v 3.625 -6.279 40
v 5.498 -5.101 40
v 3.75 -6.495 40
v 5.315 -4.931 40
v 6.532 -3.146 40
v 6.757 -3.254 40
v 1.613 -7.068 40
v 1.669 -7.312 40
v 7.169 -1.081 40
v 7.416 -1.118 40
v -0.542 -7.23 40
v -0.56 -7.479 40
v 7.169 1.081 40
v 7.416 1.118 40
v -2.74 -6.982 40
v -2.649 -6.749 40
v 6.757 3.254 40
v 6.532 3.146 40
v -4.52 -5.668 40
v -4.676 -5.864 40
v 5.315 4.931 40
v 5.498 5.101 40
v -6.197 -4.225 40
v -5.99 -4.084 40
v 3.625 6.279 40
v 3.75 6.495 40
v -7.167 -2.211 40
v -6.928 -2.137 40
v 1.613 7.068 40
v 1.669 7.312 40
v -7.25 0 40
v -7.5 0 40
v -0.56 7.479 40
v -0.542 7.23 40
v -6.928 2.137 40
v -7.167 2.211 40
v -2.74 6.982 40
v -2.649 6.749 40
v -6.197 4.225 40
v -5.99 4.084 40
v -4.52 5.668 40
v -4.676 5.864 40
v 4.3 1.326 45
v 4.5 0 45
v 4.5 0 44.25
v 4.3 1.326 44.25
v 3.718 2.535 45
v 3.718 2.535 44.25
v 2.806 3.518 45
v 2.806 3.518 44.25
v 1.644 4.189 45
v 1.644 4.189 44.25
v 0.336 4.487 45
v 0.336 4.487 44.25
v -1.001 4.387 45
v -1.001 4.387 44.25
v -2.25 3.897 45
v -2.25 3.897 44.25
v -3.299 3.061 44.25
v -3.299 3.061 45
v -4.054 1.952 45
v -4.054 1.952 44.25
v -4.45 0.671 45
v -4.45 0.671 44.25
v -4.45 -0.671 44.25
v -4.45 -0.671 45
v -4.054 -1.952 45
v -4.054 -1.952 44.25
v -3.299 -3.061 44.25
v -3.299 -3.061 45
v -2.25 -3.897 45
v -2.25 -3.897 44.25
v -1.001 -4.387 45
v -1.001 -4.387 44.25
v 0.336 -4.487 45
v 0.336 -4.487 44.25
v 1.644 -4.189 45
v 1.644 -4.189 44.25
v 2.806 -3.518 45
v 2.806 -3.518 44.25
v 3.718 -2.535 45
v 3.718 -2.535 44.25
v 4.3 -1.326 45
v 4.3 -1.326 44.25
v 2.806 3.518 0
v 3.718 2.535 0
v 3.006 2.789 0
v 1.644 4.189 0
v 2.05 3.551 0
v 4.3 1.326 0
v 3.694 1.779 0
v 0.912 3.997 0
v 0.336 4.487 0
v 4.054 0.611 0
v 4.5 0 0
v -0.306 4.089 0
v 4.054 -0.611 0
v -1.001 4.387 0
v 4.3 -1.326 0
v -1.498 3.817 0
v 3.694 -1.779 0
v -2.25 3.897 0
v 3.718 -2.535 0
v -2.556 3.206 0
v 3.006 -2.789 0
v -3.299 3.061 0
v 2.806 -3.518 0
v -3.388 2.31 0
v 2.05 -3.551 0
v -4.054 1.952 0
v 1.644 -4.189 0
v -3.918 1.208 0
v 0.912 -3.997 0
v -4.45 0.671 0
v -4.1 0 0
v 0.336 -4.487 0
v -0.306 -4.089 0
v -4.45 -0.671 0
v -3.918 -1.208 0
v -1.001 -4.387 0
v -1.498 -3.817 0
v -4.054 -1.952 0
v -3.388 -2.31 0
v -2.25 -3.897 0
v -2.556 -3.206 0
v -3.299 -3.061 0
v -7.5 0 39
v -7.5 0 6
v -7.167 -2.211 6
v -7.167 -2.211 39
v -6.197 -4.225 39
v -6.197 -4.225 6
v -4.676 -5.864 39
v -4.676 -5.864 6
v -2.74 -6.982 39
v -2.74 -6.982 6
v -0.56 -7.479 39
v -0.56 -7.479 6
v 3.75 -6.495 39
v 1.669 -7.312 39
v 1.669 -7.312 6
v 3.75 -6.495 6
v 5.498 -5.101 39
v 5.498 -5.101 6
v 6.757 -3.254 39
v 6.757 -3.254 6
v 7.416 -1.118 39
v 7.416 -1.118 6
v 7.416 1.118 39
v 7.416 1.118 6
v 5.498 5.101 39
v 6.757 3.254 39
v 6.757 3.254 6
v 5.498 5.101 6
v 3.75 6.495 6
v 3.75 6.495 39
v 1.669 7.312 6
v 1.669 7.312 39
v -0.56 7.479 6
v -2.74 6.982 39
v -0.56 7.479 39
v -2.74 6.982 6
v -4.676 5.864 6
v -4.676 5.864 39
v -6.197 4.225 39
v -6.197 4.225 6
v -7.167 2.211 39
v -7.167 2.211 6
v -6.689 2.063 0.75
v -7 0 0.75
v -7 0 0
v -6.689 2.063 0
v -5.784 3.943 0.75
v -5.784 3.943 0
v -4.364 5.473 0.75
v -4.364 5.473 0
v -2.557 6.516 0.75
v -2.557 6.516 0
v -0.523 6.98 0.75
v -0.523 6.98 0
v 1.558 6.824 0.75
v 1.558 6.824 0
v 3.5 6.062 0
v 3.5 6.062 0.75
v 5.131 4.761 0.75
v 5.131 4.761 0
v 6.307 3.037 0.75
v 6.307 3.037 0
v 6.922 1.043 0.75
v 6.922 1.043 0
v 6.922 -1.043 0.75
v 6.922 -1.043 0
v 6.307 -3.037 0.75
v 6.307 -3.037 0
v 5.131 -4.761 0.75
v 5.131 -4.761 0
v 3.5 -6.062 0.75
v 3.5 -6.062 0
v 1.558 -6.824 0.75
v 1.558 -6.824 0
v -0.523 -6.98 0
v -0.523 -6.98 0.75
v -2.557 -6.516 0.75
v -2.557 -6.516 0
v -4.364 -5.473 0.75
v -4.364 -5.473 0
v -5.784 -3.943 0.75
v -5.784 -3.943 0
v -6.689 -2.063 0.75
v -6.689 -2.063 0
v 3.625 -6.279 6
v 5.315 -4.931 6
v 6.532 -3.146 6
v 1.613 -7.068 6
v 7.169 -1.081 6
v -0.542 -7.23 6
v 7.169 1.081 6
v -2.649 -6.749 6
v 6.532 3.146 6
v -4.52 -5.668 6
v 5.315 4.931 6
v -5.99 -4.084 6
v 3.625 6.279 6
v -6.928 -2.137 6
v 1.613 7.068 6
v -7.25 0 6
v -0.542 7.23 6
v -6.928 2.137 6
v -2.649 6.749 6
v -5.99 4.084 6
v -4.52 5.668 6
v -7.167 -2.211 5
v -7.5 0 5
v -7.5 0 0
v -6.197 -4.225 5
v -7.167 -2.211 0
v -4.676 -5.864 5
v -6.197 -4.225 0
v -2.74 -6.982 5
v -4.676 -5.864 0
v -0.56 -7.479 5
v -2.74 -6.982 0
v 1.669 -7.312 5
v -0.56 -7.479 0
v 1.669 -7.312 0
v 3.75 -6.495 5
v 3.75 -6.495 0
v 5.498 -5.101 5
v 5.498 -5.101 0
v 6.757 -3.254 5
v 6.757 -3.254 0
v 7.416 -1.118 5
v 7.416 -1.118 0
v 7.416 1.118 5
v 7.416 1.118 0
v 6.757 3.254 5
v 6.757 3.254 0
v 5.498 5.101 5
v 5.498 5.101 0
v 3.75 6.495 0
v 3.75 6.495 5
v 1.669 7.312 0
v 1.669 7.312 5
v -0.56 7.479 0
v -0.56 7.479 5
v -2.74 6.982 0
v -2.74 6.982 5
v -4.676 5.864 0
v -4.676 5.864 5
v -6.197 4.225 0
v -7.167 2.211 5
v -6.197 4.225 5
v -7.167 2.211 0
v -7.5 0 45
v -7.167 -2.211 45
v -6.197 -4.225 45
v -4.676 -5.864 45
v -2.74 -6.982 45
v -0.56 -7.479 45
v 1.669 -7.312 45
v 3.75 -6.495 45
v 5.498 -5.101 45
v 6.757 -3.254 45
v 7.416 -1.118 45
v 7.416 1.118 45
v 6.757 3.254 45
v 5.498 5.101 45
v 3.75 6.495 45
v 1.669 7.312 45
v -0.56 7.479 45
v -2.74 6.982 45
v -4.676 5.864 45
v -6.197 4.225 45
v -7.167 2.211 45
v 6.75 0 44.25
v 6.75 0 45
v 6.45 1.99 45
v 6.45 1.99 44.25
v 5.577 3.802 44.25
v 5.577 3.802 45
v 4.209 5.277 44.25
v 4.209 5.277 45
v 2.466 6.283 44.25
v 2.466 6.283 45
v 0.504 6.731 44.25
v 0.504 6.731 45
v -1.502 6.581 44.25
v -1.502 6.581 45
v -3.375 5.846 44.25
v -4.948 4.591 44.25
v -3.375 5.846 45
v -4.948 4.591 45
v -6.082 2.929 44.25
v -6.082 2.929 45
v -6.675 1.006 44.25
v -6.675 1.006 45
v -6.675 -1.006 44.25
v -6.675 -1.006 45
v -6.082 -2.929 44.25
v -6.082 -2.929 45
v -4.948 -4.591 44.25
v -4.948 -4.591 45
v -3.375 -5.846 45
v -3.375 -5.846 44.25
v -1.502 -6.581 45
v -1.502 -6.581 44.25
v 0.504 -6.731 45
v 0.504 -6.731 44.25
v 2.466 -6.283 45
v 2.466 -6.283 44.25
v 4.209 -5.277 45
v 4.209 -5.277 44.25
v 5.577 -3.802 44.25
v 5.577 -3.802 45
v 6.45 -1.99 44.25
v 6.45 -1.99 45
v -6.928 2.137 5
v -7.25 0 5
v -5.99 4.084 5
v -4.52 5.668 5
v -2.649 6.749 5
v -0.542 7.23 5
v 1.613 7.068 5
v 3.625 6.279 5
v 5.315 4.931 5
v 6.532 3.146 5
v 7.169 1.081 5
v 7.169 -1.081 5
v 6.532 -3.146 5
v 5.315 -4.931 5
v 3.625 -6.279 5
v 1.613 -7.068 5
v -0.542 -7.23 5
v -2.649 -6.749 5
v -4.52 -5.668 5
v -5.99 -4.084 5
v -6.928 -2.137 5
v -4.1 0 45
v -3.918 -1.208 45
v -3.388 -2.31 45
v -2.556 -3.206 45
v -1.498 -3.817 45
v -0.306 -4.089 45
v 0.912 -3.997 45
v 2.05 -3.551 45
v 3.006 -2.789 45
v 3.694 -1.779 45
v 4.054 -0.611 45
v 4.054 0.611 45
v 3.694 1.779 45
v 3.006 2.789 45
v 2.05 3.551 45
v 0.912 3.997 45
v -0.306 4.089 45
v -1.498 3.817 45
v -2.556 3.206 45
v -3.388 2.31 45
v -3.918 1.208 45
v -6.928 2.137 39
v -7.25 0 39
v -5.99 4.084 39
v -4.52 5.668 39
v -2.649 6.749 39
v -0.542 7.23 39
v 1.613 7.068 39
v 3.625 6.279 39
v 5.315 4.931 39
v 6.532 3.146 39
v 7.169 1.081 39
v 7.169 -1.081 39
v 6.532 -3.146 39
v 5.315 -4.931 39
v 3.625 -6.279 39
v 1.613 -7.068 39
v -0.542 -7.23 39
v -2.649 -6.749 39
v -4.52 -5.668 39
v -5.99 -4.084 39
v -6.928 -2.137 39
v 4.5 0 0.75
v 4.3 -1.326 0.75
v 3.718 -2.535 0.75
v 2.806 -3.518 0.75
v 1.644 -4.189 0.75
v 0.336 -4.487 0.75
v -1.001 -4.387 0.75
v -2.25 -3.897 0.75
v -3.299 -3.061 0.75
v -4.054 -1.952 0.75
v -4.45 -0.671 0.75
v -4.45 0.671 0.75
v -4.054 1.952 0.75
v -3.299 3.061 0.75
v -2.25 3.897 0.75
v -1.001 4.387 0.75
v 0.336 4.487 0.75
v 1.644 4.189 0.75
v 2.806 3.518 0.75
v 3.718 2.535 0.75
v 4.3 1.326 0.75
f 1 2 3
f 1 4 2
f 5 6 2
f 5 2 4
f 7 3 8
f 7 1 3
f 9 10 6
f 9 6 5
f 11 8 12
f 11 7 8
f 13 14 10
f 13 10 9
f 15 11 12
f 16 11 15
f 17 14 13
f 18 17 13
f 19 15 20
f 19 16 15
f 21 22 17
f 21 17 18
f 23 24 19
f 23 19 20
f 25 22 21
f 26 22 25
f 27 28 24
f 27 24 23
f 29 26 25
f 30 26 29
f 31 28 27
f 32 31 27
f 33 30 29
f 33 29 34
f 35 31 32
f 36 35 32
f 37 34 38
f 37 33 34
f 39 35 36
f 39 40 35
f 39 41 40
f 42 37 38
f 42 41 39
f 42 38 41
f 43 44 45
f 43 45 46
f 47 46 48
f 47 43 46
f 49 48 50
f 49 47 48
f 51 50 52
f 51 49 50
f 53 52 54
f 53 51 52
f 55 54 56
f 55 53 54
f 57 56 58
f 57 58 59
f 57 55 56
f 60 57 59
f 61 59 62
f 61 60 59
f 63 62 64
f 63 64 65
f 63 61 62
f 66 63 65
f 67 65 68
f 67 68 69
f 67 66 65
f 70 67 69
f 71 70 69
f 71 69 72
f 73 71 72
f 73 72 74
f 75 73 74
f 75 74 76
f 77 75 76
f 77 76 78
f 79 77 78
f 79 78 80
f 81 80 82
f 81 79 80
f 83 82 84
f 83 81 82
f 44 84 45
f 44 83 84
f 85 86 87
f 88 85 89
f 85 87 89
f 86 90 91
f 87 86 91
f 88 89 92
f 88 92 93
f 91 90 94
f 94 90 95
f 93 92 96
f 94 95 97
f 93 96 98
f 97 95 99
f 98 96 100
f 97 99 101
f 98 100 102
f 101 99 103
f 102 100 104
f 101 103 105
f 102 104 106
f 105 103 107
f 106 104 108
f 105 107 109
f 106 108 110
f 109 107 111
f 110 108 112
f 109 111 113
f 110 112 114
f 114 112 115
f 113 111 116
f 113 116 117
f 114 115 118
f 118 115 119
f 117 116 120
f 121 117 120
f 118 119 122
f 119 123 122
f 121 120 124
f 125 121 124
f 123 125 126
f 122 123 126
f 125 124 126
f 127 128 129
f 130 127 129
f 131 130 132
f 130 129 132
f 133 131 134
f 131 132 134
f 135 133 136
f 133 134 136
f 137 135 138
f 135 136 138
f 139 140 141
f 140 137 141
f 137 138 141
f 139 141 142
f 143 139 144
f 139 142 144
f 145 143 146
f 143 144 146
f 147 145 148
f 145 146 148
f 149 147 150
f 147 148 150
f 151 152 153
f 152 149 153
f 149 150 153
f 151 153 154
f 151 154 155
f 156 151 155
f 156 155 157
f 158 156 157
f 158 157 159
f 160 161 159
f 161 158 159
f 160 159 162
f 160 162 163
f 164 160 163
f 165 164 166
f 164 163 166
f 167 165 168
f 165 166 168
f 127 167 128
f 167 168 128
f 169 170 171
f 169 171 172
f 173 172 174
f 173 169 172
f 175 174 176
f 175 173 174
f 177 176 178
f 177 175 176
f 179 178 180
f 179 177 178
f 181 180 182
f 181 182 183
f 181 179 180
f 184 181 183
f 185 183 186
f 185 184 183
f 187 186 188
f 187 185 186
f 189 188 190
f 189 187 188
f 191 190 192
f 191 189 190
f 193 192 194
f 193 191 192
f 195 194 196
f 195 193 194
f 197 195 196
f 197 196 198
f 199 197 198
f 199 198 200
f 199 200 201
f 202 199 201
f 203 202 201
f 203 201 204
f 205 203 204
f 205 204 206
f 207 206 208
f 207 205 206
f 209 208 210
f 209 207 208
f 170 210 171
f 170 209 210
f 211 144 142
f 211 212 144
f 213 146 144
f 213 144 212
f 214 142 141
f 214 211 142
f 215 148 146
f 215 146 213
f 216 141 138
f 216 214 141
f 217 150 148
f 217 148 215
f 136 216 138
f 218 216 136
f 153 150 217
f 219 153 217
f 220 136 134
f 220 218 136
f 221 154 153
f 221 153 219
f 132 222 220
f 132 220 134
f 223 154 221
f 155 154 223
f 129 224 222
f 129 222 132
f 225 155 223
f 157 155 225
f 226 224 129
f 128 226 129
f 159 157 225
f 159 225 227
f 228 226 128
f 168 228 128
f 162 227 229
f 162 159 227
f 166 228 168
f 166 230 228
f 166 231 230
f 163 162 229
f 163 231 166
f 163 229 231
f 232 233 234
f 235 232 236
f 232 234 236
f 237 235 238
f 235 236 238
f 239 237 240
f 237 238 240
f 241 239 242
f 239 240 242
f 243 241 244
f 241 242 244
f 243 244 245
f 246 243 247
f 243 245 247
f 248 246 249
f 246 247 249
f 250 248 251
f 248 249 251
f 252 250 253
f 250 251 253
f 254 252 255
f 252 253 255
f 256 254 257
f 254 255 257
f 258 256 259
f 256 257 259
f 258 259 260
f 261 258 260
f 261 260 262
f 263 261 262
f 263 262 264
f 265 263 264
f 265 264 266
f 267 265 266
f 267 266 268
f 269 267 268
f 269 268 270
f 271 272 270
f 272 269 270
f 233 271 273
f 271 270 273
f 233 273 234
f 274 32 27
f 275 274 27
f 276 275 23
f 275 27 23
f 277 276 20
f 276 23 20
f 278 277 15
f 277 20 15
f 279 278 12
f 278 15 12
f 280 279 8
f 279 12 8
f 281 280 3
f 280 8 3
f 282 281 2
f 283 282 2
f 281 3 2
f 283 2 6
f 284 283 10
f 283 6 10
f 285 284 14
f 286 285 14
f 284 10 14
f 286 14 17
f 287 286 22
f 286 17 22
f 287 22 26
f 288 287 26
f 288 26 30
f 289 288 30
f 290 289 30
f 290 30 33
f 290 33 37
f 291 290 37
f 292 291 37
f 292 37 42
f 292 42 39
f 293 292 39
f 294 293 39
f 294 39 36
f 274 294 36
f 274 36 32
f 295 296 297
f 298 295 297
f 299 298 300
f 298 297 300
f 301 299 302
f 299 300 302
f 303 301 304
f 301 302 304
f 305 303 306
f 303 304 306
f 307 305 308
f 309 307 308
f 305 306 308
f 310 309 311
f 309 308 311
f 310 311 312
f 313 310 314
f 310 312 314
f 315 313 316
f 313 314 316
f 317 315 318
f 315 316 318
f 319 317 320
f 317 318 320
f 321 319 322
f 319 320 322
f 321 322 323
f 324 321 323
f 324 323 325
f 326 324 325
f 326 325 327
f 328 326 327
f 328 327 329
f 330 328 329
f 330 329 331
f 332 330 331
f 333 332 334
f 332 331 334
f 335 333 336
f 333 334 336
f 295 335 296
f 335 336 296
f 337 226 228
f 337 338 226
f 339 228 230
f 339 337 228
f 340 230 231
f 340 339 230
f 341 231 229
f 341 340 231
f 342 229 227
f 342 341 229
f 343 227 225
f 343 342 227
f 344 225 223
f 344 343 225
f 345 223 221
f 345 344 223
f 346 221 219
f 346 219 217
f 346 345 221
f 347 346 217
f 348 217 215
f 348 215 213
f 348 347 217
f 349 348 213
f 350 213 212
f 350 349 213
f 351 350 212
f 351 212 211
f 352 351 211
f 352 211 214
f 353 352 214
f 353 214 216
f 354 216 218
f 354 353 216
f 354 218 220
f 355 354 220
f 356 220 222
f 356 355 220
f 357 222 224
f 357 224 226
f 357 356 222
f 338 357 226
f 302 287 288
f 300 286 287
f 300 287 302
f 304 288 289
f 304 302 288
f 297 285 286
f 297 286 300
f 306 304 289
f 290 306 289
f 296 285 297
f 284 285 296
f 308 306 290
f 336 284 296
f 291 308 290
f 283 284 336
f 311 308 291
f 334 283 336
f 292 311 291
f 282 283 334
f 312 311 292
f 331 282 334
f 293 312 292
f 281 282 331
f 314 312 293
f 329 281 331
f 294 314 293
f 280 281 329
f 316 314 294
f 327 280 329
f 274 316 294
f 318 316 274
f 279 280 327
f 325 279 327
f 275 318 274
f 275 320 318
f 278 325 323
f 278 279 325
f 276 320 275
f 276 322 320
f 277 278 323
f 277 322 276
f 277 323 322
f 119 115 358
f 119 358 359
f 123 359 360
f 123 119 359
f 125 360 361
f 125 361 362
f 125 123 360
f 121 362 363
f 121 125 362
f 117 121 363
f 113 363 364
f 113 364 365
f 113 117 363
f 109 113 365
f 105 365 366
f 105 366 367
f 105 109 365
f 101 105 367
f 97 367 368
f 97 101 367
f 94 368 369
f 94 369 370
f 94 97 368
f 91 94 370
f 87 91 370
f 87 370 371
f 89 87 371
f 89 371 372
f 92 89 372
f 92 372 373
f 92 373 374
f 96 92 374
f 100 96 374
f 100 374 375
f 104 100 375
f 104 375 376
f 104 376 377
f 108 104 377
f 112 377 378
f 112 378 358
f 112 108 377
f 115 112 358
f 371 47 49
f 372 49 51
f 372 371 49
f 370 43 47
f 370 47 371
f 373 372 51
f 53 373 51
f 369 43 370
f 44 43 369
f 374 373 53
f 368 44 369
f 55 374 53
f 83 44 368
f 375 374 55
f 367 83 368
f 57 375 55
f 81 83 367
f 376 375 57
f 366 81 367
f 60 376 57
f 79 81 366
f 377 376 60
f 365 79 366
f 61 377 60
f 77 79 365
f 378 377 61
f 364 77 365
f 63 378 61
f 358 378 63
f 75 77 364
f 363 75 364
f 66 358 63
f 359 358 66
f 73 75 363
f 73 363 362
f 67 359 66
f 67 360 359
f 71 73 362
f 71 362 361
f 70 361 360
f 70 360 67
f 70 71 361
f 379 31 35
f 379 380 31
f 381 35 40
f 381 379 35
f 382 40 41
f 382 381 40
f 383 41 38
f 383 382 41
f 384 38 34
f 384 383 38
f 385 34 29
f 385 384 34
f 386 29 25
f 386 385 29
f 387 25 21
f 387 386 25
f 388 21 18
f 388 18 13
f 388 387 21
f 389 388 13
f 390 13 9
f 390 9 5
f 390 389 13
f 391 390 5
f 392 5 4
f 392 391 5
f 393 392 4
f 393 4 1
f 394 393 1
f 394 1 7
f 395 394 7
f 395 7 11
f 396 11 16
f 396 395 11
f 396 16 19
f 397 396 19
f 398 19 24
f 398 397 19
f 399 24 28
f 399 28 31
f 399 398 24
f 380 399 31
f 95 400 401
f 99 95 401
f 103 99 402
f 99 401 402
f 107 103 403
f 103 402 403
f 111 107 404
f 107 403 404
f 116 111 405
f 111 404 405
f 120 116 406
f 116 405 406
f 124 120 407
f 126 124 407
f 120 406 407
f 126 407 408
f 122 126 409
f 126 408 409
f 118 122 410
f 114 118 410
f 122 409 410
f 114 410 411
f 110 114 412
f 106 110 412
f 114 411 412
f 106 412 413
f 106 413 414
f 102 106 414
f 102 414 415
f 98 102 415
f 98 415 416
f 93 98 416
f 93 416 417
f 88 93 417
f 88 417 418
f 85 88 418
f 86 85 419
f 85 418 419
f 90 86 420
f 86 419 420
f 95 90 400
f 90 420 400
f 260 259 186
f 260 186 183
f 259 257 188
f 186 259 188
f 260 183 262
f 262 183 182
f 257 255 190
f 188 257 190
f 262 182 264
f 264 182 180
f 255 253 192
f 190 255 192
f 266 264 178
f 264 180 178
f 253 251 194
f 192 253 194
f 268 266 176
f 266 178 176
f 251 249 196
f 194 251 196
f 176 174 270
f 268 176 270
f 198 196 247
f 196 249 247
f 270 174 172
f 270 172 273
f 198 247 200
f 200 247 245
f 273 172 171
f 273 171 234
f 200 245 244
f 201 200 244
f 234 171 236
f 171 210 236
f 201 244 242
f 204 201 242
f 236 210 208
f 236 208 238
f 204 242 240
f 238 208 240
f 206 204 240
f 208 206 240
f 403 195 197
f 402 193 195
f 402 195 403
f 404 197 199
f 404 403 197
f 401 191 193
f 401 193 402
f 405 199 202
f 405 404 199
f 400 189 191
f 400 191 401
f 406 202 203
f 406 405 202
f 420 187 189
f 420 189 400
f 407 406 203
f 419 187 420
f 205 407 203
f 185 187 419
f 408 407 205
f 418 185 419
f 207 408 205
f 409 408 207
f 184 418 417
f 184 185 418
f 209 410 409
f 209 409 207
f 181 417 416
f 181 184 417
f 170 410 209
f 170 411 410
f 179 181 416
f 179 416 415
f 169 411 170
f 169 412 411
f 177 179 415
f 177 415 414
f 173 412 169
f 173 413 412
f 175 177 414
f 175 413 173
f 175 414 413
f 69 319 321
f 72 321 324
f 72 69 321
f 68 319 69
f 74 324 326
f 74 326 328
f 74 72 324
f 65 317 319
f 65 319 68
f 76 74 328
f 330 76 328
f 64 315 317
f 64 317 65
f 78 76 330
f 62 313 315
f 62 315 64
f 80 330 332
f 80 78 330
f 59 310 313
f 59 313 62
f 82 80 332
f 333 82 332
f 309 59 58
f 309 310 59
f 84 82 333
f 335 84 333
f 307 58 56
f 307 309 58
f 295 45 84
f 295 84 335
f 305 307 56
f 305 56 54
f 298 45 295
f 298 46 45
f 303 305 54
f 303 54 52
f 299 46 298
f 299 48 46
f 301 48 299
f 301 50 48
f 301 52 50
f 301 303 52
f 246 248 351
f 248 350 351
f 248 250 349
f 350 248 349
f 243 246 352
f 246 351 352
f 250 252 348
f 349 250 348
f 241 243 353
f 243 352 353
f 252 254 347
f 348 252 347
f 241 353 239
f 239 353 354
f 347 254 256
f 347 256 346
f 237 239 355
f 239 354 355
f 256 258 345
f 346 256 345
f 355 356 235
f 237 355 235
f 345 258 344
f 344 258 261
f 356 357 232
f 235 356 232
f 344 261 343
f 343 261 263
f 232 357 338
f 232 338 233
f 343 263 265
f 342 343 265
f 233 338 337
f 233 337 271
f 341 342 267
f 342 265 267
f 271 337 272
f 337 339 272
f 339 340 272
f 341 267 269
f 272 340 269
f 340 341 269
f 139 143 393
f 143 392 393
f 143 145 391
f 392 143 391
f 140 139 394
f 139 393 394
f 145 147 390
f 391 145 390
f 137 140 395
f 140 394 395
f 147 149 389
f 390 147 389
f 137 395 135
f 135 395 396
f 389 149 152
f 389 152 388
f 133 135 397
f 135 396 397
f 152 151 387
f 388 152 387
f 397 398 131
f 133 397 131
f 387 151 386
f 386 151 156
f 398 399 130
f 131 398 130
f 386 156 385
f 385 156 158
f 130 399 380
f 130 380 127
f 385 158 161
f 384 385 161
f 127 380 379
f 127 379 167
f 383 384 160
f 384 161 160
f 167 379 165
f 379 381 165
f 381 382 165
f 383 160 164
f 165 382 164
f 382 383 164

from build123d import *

# Parameters (mm, degrees)
SKETCH1_R           = 7.5
SKETCH1_R_2         = 4.1
BOSS_EXTRUDE1_DEPTH = 45
SKETCH2_R           = 6.75
SKETCH2_R_2         = 4.5
CUT_EXTRUDE2_DEPTH  = 0.75
CUT_EXTRUDE3_START  = -0.75
SKETCH3_R           = 7
SKETCH3_R_2         = 4.5
CUT_EXTRUDE3_DEPTH  = 0.75
SKETCH4_W           = 0.25
SKETCH4_H           = 1
SKETCH5_W           = 0.25
SKETCH5_H           = 1


with BuildPart() as part:
    # Sketch1 → Boss-Extrude1 (new body)
    with BuildSketch(Plane.XY):
        with Locations(Location((0, 0, 0), (0, 0, 180))):
            Circle(SKETCH1_R)
        with Locations(Location((0, 0, 0), (0, 0, 180))):
            Circle(SKETCH1_R_2, mode=Mode.SUBTRACT)
    extrude(amount=BOSS_EXTRUDE1_DEPTH)

    # Sketch2 → Cut-Extrude2 (cut)
    with BuildSketch(Plane.XY.offset(45)):
        Circle(SKETCH2_R)
        Circle(SKETCH2_R_2, mode=Mode.SUBTRACT)
    extrude(amount=-CUT_EXTRUDE2_DEPTH, mode=Mode.SUBTRACT)

    # Sketch3 → Cut-Extrude3 (cut)
    with BuildSketch(Plane(origin=(0, 0, 0), x_dir=(-1, 0, 0), z_dir=(0, 0, -1)).offset(CUT_EXTRUDE3_START)):
        Circle(SKETCH3_R)
        with Locations(Location((0, 0, 0), (0, 0, 180))):
            Circle(SKETCH3_R_2, mode=Mode.SUBTRACT)
    extrude(amount=CUT_EXTRUDE3_DEPTH, mode=Mode.SUBTRACT)

    # Sketch4 → Cut-Revolve1 (revolve, cut)
    with BuildSketch(Plane(origin=(0, 0, 0), x_dir=(1, 0, 0), z_dir=(0, 1, 0))):
        with Locations((-7.375, -39.5)):
            Rectangle(SKETCH4_W, SKETCH4_H)
    revolve(axis=Axis((0, 0, 45), (0, 0, -1)), mode=Mode.SUBTRACT)

    # Sketch5 → Cut-Revolve2 (revolve, cut)
    with BuildSketch(Plane(origin=(0, 0, 0), x_dir=(1, 0, 0), z_dir=(0, 1, 0))):
        with Locations((-7.375, -5.5)):
            Rectangle(SKETCH5_W, SKETCH5_H)
    revolve(axis=Axis((0, 0, 45), (0, 0, -1)), mode=Mode.SUBTRACT)


solid = part.part
